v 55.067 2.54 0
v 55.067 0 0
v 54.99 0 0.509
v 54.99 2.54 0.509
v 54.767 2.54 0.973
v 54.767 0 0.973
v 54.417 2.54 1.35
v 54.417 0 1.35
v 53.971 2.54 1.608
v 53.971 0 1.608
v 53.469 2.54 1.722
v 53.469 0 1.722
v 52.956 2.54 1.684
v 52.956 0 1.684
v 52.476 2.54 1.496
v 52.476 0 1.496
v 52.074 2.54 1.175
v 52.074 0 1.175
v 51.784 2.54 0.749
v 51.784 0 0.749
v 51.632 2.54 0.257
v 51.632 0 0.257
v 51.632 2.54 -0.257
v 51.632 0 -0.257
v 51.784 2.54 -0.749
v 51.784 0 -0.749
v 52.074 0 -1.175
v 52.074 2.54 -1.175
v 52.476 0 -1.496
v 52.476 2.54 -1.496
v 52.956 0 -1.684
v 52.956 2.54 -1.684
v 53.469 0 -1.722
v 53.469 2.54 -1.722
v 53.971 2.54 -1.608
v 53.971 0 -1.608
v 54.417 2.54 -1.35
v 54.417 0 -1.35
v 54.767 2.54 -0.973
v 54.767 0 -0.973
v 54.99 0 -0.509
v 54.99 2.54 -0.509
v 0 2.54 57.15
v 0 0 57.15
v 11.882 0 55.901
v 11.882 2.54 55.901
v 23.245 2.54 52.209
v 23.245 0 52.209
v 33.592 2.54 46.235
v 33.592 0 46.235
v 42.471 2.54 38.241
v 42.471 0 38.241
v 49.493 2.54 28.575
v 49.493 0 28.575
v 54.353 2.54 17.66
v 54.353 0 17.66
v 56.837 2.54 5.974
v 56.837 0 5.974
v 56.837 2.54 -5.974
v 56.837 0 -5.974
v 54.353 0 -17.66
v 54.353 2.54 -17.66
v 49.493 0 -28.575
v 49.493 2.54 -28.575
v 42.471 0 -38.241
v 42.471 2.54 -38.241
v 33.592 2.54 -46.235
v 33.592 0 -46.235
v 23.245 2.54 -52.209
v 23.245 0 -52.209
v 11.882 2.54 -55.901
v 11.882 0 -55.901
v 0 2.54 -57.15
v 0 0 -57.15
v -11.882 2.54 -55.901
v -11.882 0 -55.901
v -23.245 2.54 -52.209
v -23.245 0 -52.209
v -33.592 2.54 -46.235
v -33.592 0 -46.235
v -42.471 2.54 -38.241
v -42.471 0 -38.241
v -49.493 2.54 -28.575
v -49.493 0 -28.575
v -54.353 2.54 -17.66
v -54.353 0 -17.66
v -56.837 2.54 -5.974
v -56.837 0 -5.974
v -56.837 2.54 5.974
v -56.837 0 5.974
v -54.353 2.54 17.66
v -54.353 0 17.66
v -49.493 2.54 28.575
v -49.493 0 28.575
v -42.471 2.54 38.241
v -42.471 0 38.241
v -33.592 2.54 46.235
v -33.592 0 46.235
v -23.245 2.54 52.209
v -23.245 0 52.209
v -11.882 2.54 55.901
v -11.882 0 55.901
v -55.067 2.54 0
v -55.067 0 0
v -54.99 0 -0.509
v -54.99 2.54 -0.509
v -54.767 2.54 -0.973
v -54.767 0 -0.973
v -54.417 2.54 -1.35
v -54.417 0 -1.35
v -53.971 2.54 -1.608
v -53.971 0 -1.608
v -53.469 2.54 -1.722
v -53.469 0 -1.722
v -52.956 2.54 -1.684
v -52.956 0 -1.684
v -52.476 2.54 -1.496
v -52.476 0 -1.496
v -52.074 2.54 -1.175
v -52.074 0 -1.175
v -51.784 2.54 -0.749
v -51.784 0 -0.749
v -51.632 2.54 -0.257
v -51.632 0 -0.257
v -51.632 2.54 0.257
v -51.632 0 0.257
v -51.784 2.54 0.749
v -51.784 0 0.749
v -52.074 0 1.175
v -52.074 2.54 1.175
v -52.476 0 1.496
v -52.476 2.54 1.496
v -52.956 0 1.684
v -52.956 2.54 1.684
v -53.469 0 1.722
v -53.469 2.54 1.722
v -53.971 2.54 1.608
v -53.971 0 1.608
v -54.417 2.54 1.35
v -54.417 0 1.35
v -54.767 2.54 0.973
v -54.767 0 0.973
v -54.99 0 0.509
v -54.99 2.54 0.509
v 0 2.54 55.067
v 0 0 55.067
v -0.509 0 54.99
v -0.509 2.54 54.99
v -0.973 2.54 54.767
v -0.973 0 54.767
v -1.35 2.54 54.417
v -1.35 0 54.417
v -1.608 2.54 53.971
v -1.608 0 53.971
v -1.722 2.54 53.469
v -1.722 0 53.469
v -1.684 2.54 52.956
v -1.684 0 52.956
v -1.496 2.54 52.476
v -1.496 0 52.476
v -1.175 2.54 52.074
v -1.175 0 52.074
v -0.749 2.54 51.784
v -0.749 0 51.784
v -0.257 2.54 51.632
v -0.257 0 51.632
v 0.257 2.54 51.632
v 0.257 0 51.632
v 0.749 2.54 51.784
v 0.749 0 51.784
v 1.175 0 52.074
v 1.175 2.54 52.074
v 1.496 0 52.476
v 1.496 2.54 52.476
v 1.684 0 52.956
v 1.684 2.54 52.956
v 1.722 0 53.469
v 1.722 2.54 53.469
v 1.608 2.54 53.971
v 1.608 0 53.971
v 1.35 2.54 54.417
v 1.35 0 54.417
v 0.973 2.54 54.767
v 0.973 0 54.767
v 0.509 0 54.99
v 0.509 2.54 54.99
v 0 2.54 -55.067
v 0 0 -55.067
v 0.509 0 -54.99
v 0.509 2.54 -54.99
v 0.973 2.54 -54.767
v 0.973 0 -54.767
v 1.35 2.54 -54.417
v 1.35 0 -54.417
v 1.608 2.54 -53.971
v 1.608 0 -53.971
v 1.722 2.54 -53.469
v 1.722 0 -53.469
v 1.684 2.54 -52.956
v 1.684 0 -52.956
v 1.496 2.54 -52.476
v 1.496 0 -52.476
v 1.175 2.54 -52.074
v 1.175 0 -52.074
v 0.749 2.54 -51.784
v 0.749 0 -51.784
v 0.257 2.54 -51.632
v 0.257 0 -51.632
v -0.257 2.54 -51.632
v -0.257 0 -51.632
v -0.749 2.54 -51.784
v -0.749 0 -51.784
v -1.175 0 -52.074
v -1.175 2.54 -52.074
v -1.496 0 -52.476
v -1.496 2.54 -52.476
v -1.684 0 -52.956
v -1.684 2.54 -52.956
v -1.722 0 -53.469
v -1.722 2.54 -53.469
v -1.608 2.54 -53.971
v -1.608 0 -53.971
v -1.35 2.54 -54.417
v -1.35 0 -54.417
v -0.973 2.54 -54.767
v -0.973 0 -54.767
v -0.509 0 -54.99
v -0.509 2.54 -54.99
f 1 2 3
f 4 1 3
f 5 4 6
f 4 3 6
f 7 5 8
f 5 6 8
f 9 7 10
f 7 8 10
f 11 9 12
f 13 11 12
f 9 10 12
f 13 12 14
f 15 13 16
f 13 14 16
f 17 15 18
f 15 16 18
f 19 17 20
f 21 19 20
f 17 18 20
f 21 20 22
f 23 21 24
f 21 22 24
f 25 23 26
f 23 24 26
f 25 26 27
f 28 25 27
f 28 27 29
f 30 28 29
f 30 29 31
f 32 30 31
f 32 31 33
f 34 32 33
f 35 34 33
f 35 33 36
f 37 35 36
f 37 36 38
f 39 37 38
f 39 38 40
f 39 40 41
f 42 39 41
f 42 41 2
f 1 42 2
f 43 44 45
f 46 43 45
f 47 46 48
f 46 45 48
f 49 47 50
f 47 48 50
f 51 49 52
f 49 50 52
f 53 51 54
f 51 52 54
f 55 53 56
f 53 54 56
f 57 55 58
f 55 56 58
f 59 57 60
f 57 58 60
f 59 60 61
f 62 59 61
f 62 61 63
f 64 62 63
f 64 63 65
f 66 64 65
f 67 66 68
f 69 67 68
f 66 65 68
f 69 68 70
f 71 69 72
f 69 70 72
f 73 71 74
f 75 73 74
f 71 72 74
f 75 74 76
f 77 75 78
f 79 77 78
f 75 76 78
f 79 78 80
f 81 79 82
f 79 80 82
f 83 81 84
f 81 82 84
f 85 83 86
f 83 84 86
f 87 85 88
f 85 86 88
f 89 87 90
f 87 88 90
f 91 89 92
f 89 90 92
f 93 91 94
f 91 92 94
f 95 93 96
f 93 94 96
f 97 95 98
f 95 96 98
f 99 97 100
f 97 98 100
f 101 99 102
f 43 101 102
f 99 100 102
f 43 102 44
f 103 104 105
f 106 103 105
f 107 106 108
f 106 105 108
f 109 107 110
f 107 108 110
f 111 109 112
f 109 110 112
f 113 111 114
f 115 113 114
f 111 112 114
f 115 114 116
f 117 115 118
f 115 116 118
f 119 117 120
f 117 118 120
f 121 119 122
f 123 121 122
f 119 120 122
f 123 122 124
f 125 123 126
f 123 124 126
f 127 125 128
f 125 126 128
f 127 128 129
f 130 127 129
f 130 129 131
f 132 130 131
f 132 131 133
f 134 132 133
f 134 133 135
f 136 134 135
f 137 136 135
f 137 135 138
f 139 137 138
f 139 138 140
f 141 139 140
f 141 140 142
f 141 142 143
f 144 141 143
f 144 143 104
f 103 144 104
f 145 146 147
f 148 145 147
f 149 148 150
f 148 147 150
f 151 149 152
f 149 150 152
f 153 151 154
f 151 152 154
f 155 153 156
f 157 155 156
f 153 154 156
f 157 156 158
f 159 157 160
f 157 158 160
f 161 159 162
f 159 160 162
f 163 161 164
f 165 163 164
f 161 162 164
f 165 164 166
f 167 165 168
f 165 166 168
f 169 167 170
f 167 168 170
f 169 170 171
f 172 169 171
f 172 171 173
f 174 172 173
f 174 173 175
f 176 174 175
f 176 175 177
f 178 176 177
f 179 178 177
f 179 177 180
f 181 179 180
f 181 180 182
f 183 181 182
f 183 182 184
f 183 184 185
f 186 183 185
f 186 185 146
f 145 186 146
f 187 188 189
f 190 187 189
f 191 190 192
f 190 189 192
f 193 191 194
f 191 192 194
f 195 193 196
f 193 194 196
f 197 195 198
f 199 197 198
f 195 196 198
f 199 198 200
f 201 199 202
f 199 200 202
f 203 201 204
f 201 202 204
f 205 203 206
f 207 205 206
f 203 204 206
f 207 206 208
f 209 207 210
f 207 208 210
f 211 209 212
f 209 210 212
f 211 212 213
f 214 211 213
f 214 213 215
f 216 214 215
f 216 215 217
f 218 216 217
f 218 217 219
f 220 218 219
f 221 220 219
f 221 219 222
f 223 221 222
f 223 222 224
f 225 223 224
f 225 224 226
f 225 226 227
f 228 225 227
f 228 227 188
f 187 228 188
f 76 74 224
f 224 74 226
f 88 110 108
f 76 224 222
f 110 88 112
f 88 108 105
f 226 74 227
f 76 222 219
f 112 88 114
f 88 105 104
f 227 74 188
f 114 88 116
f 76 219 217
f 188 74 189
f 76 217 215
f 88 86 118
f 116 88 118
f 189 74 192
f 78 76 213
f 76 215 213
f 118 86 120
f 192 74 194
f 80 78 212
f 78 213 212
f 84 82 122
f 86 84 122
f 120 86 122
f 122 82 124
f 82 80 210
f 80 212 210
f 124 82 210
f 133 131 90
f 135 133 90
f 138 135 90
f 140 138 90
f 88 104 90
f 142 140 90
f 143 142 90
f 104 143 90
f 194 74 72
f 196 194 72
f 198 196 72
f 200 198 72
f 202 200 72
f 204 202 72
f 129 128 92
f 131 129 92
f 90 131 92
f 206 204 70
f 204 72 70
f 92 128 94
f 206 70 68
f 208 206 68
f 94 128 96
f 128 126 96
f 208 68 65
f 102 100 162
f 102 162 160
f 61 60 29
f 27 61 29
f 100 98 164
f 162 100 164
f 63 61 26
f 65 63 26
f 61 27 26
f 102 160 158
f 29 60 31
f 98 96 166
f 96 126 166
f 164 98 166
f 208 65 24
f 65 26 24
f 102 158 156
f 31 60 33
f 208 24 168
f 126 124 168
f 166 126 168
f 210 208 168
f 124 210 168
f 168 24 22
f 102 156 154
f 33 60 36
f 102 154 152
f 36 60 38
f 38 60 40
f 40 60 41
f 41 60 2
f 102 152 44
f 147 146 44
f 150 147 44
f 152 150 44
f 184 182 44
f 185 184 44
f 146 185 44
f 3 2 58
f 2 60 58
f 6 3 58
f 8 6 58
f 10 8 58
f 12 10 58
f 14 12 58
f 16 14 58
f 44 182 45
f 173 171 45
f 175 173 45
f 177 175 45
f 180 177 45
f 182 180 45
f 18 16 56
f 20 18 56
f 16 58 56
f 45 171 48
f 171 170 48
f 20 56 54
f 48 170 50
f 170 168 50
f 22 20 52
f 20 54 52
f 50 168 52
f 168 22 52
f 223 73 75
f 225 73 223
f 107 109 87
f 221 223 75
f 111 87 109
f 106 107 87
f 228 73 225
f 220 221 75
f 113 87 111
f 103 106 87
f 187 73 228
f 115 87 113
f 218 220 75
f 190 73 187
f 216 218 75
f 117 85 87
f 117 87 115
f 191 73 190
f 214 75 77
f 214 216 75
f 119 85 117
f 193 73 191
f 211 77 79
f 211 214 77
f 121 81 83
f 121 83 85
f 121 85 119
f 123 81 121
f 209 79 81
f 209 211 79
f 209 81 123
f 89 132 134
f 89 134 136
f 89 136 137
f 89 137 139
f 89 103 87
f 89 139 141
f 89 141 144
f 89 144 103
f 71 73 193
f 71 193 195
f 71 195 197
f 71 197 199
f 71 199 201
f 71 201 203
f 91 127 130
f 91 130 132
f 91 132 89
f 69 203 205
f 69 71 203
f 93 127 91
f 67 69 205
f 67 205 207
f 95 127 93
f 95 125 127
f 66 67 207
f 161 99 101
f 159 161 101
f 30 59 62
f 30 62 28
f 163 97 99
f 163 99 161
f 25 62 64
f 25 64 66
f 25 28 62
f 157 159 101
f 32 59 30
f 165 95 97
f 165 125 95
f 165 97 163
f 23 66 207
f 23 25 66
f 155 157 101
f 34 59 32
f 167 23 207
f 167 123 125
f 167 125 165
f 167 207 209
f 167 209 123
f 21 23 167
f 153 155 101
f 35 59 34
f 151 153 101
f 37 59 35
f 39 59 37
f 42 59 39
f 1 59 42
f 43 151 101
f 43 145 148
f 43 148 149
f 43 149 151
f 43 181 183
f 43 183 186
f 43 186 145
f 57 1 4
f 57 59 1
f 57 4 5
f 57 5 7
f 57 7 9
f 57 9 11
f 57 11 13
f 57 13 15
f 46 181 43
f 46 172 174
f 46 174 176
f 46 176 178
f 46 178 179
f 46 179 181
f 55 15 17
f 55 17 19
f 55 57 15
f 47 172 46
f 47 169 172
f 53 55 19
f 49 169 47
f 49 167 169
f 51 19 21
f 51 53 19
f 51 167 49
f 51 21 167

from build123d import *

# Parameters (mm, degrees)
SKETCH1_R             = 57.15
BOSS_EXTRUDE1_DEPTH   = 2.54
F_8_32_TAPPED_HOLE1_D = 3.4544
CIRPATTERN2_COUNT     = 4


with BuildPart() as part:
    # Sketch1 → Boss-Extrude1 (new body)
    with BuildSketch(Plane(origin=(0, 0, 0), x_dir=(1, 0, 0), z_dir=(0, 1, 0))):
        with Locations(Location((0, 0, 0), (0, 0, 270))):
            Circle(SKETCH1_R)
    extrude(amount=BOSS_EXTRUDE1_DEPTH)

    # #8-32 Tapped Hole1 (through all)
    with Locations(Plane(origin=(0, 2.54, 0), x_dir=(1, 0, 0), z_dir=(0, 1, 0))):
        with Locations((-53.34, 0)):
            f_8_32_tapped_hole1 = Hole(F_8_32_TAPPED_HOLE1_D / 2)

    # CirPattern2: #8-32 Tapped Hole1 ×4 about axis
    cirpattern2_axis = Axis((0, 0, 0), (0, 1, 0))
    for i in range(1, CIRPATTERN2_COUNT):
        add(f_8_32_tapped_hole1.rotate(cirpattern2_axis, i * 360 / CIRPATTERN2_COUNT), mode=Mode.SUBTRACT)


solid = part.part
